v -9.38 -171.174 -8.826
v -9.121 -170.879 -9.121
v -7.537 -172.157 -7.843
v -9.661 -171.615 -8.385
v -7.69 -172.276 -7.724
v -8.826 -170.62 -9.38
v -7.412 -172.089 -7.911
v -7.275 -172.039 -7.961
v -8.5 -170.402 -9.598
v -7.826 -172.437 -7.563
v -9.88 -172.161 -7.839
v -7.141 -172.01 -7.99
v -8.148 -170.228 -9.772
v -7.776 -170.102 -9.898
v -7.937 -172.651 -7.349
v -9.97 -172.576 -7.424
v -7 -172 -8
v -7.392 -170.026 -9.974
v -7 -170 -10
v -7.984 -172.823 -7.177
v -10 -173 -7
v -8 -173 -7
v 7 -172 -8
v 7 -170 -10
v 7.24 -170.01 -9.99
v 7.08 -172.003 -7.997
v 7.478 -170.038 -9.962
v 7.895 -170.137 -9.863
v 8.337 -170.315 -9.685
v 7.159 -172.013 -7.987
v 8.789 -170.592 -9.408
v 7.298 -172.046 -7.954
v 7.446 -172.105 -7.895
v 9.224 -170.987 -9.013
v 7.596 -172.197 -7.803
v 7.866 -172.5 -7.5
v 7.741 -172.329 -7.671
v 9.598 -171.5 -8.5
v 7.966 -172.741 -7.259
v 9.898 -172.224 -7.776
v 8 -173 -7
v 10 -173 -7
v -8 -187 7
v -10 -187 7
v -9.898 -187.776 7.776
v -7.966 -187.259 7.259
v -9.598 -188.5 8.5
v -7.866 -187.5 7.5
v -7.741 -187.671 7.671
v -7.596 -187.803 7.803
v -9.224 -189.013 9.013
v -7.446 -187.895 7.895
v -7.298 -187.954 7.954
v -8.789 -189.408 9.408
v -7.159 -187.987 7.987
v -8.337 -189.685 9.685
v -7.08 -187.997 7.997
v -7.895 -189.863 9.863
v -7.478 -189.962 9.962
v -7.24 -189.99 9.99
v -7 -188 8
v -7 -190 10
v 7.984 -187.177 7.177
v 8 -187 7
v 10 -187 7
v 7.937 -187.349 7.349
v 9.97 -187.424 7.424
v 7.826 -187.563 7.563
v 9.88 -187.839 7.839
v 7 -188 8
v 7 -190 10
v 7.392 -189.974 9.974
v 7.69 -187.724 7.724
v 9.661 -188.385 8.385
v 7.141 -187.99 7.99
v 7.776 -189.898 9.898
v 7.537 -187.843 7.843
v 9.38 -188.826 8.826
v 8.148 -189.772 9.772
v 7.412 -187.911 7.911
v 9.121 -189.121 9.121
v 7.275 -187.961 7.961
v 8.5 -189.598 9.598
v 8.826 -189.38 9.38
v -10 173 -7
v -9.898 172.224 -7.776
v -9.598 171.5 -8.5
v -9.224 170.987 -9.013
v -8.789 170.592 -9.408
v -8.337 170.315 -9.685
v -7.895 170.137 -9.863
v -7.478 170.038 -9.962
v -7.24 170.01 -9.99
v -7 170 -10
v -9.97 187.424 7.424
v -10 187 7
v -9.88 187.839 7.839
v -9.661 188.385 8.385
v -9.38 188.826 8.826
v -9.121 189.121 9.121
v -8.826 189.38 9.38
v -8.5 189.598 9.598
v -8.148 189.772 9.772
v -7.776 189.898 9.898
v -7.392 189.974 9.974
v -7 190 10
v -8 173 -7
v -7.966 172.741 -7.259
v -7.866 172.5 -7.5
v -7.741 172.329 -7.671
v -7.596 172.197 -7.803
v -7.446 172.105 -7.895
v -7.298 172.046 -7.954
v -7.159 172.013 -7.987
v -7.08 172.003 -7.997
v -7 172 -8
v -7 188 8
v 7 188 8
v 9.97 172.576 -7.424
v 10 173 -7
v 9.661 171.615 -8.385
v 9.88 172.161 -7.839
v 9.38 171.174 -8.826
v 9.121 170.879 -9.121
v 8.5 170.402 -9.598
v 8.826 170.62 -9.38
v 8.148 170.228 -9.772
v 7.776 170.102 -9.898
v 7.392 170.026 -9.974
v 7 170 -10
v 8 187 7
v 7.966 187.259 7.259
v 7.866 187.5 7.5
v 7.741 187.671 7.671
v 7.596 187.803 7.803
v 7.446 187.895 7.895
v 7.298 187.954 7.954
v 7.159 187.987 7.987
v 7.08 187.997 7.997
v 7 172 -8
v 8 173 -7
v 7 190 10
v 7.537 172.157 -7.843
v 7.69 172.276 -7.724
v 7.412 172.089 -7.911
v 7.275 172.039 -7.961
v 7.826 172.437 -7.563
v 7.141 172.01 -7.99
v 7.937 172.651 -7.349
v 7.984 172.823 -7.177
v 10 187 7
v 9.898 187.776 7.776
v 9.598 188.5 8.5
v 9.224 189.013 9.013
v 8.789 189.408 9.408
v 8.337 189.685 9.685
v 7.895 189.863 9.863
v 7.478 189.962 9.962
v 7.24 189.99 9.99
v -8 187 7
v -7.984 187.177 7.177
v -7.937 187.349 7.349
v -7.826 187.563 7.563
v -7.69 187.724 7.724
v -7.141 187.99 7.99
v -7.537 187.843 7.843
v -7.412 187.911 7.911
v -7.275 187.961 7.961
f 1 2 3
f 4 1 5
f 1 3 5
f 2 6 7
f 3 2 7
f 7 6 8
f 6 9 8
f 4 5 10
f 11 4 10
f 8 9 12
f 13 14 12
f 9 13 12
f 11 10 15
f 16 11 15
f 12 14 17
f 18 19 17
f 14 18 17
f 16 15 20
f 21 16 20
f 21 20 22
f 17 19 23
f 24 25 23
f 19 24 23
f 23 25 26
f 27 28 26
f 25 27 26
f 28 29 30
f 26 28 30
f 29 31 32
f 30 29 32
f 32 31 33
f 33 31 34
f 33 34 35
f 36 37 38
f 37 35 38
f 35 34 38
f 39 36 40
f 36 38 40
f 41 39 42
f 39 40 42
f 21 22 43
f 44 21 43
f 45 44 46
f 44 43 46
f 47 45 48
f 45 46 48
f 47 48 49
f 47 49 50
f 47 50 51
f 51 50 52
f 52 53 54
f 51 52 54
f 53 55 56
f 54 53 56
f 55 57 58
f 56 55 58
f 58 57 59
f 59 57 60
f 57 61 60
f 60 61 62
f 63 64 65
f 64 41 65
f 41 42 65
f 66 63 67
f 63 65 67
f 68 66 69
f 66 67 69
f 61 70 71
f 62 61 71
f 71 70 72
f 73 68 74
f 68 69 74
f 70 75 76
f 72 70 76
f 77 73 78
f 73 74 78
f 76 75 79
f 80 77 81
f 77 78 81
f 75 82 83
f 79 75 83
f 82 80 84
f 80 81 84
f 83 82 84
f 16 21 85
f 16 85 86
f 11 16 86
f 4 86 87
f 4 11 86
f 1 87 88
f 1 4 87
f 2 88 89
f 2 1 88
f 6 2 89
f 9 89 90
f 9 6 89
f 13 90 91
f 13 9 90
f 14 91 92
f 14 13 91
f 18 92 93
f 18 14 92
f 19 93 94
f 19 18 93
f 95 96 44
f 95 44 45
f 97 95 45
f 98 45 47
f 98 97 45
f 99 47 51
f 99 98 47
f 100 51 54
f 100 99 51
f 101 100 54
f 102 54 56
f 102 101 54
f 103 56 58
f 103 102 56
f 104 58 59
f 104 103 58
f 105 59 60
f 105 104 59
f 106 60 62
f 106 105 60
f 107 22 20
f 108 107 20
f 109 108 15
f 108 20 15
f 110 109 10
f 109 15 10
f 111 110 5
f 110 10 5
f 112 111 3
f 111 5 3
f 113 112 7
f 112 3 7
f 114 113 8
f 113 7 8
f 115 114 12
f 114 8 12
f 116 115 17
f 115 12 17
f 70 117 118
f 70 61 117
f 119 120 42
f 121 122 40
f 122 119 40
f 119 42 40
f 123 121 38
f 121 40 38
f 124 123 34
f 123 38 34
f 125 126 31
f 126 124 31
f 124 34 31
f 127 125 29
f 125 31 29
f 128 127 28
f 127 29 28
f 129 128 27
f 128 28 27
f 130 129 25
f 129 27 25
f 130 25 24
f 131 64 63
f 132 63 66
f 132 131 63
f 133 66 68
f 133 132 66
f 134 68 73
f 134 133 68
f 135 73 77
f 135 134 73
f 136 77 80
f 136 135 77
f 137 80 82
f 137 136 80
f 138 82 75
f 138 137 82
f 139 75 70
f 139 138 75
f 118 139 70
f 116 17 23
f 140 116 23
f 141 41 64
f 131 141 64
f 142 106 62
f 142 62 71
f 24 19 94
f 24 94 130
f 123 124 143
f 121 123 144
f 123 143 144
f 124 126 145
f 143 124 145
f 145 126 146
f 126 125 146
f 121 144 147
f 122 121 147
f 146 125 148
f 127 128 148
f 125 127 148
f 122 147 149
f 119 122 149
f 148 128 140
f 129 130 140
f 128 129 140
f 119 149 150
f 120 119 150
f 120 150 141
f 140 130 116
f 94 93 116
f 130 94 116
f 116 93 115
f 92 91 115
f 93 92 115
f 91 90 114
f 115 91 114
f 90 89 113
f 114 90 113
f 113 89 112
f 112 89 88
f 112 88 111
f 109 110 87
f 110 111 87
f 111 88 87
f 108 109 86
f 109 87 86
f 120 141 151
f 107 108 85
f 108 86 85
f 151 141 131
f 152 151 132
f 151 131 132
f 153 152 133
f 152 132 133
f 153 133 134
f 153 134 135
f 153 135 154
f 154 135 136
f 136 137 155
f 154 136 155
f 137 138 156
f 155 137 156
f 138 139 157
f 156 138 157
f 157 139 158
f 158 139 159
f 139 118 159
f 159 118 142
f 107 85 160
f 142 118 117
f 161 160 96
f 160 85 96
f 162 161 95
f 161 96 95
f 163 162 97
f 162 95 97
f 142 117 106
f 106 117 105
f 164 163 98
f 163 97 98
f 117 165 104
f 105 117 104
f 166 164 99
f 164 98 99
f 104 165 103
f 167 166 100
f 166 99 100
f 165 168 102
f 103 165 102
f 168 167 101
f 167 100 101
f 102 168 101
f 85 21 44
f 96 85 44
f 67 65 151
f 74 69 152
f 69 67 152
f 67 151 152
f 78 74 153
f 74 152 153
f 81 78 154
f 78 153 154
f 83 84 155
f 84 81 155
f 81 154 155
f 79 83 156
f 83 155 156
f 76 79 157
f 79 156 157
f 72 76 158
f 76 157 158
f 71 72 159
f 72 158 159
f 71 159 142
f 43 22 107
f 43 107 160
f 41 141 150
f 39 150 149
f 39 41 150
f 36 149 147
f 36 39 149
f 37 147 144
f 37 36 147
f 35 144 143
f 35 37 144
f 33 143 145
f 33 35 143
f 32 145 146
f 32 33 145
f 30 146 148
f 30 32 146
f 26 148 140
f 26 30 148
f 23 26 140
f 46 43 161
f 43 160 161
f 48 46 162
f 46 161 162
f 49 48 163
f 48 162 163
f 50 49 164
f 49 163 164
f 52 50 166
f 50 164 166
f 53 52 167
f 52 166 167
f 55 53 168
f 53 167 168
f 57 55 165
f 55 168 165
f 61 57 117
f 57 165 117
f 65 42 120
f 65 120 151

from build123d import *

# Parameters (mm, degrees)
F2_W     = 20
F2_H     = 20
F3_DEPTH = 190
F4_R     = 3
F5_T     = -2
F7_DEPTH = 20.001
F9_DEPTH = 20.001


with BuildPart() as f3:
    # F2 (on Front) → F3 (new body, symmetric)
    with BuildSketch(Plane.XZ):
        Rectangle(F2_W, F2_H)
    extrude(amount=F3_DEPTH, both=True)

    # F4
    f4_edges = [f3.edges().sort_by_distance(p)[0] for p in [
        (10, 0, 10),
        (-10, 0, 10),
        (10, 0, -10),
        (-10, 0, -10),
    ]]
    fillet(f4_edges, radius=F4_R)

    # F5
    f5_openings = [f3.faces().sort_by_distance(p)[0] for p in [
        (0, -190, 0),
        (0, 190, 0),
    ]]
    offset(amount=F5_T, openings=f5_openings)

    # F6 (on face) → F7 (cut, through all)
    with BuildSketch(Plane(origin=(-10, 0, 0), x_dir=(0, -1, 0), z_dir=(-1, 0, 0))):
        Polygon((-190, 10), (-190, -10), (-170, -10), align=None)
    extrude(amount=-F7_DEPTH, mode=Mode.SUBTRACT)

    # F8 (on face) → F9 (cut, through all)
    with BuildSketch(Plane.YZ.offset(10)):
        Polygon((-190, -10), (-170, -10), (-190, 10), align=None)
    extrude(amount=-F9_DEPTH, mode=Mode.SUBTRACT)


solid = f3.part
